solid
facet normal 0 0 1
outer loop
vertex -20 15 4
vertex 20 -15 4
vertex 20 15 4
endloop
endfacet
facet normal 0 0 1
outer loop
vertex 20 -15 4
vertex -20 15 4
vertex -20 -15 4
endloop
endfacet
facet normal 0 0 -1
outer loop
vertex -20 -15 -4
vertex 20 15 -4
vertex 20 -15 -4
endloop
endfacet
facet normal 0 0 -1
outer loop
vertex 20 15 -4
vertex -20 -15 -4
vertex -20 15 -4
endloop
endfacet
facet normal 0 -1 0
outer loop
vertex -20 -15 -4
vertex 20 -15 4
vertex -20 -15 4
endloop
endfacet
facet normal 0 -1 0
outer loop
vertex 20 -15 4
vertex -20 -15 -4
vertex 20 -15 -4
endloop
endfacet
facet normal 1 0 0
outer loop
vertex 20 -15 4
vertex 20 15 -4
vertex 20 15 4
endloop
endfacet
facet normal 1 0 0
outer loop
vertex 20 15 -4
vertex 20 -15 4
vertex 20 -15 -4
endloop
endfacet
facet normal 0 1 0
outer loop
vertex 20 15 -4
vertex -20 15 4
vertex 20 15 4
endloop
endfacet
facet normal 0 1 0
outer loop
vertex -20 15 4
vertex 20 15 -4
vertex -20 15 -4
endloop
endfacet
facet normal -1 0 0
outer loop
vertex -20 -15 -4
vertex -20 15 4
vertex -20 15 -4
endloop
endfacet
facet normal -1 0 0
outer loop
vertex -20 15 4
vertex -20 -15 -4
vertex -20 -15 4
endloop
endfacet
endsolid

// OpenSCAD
// Codex correction; all lengths are mm. Synthetic test requirement.
cube([40,30,8],center=true);
